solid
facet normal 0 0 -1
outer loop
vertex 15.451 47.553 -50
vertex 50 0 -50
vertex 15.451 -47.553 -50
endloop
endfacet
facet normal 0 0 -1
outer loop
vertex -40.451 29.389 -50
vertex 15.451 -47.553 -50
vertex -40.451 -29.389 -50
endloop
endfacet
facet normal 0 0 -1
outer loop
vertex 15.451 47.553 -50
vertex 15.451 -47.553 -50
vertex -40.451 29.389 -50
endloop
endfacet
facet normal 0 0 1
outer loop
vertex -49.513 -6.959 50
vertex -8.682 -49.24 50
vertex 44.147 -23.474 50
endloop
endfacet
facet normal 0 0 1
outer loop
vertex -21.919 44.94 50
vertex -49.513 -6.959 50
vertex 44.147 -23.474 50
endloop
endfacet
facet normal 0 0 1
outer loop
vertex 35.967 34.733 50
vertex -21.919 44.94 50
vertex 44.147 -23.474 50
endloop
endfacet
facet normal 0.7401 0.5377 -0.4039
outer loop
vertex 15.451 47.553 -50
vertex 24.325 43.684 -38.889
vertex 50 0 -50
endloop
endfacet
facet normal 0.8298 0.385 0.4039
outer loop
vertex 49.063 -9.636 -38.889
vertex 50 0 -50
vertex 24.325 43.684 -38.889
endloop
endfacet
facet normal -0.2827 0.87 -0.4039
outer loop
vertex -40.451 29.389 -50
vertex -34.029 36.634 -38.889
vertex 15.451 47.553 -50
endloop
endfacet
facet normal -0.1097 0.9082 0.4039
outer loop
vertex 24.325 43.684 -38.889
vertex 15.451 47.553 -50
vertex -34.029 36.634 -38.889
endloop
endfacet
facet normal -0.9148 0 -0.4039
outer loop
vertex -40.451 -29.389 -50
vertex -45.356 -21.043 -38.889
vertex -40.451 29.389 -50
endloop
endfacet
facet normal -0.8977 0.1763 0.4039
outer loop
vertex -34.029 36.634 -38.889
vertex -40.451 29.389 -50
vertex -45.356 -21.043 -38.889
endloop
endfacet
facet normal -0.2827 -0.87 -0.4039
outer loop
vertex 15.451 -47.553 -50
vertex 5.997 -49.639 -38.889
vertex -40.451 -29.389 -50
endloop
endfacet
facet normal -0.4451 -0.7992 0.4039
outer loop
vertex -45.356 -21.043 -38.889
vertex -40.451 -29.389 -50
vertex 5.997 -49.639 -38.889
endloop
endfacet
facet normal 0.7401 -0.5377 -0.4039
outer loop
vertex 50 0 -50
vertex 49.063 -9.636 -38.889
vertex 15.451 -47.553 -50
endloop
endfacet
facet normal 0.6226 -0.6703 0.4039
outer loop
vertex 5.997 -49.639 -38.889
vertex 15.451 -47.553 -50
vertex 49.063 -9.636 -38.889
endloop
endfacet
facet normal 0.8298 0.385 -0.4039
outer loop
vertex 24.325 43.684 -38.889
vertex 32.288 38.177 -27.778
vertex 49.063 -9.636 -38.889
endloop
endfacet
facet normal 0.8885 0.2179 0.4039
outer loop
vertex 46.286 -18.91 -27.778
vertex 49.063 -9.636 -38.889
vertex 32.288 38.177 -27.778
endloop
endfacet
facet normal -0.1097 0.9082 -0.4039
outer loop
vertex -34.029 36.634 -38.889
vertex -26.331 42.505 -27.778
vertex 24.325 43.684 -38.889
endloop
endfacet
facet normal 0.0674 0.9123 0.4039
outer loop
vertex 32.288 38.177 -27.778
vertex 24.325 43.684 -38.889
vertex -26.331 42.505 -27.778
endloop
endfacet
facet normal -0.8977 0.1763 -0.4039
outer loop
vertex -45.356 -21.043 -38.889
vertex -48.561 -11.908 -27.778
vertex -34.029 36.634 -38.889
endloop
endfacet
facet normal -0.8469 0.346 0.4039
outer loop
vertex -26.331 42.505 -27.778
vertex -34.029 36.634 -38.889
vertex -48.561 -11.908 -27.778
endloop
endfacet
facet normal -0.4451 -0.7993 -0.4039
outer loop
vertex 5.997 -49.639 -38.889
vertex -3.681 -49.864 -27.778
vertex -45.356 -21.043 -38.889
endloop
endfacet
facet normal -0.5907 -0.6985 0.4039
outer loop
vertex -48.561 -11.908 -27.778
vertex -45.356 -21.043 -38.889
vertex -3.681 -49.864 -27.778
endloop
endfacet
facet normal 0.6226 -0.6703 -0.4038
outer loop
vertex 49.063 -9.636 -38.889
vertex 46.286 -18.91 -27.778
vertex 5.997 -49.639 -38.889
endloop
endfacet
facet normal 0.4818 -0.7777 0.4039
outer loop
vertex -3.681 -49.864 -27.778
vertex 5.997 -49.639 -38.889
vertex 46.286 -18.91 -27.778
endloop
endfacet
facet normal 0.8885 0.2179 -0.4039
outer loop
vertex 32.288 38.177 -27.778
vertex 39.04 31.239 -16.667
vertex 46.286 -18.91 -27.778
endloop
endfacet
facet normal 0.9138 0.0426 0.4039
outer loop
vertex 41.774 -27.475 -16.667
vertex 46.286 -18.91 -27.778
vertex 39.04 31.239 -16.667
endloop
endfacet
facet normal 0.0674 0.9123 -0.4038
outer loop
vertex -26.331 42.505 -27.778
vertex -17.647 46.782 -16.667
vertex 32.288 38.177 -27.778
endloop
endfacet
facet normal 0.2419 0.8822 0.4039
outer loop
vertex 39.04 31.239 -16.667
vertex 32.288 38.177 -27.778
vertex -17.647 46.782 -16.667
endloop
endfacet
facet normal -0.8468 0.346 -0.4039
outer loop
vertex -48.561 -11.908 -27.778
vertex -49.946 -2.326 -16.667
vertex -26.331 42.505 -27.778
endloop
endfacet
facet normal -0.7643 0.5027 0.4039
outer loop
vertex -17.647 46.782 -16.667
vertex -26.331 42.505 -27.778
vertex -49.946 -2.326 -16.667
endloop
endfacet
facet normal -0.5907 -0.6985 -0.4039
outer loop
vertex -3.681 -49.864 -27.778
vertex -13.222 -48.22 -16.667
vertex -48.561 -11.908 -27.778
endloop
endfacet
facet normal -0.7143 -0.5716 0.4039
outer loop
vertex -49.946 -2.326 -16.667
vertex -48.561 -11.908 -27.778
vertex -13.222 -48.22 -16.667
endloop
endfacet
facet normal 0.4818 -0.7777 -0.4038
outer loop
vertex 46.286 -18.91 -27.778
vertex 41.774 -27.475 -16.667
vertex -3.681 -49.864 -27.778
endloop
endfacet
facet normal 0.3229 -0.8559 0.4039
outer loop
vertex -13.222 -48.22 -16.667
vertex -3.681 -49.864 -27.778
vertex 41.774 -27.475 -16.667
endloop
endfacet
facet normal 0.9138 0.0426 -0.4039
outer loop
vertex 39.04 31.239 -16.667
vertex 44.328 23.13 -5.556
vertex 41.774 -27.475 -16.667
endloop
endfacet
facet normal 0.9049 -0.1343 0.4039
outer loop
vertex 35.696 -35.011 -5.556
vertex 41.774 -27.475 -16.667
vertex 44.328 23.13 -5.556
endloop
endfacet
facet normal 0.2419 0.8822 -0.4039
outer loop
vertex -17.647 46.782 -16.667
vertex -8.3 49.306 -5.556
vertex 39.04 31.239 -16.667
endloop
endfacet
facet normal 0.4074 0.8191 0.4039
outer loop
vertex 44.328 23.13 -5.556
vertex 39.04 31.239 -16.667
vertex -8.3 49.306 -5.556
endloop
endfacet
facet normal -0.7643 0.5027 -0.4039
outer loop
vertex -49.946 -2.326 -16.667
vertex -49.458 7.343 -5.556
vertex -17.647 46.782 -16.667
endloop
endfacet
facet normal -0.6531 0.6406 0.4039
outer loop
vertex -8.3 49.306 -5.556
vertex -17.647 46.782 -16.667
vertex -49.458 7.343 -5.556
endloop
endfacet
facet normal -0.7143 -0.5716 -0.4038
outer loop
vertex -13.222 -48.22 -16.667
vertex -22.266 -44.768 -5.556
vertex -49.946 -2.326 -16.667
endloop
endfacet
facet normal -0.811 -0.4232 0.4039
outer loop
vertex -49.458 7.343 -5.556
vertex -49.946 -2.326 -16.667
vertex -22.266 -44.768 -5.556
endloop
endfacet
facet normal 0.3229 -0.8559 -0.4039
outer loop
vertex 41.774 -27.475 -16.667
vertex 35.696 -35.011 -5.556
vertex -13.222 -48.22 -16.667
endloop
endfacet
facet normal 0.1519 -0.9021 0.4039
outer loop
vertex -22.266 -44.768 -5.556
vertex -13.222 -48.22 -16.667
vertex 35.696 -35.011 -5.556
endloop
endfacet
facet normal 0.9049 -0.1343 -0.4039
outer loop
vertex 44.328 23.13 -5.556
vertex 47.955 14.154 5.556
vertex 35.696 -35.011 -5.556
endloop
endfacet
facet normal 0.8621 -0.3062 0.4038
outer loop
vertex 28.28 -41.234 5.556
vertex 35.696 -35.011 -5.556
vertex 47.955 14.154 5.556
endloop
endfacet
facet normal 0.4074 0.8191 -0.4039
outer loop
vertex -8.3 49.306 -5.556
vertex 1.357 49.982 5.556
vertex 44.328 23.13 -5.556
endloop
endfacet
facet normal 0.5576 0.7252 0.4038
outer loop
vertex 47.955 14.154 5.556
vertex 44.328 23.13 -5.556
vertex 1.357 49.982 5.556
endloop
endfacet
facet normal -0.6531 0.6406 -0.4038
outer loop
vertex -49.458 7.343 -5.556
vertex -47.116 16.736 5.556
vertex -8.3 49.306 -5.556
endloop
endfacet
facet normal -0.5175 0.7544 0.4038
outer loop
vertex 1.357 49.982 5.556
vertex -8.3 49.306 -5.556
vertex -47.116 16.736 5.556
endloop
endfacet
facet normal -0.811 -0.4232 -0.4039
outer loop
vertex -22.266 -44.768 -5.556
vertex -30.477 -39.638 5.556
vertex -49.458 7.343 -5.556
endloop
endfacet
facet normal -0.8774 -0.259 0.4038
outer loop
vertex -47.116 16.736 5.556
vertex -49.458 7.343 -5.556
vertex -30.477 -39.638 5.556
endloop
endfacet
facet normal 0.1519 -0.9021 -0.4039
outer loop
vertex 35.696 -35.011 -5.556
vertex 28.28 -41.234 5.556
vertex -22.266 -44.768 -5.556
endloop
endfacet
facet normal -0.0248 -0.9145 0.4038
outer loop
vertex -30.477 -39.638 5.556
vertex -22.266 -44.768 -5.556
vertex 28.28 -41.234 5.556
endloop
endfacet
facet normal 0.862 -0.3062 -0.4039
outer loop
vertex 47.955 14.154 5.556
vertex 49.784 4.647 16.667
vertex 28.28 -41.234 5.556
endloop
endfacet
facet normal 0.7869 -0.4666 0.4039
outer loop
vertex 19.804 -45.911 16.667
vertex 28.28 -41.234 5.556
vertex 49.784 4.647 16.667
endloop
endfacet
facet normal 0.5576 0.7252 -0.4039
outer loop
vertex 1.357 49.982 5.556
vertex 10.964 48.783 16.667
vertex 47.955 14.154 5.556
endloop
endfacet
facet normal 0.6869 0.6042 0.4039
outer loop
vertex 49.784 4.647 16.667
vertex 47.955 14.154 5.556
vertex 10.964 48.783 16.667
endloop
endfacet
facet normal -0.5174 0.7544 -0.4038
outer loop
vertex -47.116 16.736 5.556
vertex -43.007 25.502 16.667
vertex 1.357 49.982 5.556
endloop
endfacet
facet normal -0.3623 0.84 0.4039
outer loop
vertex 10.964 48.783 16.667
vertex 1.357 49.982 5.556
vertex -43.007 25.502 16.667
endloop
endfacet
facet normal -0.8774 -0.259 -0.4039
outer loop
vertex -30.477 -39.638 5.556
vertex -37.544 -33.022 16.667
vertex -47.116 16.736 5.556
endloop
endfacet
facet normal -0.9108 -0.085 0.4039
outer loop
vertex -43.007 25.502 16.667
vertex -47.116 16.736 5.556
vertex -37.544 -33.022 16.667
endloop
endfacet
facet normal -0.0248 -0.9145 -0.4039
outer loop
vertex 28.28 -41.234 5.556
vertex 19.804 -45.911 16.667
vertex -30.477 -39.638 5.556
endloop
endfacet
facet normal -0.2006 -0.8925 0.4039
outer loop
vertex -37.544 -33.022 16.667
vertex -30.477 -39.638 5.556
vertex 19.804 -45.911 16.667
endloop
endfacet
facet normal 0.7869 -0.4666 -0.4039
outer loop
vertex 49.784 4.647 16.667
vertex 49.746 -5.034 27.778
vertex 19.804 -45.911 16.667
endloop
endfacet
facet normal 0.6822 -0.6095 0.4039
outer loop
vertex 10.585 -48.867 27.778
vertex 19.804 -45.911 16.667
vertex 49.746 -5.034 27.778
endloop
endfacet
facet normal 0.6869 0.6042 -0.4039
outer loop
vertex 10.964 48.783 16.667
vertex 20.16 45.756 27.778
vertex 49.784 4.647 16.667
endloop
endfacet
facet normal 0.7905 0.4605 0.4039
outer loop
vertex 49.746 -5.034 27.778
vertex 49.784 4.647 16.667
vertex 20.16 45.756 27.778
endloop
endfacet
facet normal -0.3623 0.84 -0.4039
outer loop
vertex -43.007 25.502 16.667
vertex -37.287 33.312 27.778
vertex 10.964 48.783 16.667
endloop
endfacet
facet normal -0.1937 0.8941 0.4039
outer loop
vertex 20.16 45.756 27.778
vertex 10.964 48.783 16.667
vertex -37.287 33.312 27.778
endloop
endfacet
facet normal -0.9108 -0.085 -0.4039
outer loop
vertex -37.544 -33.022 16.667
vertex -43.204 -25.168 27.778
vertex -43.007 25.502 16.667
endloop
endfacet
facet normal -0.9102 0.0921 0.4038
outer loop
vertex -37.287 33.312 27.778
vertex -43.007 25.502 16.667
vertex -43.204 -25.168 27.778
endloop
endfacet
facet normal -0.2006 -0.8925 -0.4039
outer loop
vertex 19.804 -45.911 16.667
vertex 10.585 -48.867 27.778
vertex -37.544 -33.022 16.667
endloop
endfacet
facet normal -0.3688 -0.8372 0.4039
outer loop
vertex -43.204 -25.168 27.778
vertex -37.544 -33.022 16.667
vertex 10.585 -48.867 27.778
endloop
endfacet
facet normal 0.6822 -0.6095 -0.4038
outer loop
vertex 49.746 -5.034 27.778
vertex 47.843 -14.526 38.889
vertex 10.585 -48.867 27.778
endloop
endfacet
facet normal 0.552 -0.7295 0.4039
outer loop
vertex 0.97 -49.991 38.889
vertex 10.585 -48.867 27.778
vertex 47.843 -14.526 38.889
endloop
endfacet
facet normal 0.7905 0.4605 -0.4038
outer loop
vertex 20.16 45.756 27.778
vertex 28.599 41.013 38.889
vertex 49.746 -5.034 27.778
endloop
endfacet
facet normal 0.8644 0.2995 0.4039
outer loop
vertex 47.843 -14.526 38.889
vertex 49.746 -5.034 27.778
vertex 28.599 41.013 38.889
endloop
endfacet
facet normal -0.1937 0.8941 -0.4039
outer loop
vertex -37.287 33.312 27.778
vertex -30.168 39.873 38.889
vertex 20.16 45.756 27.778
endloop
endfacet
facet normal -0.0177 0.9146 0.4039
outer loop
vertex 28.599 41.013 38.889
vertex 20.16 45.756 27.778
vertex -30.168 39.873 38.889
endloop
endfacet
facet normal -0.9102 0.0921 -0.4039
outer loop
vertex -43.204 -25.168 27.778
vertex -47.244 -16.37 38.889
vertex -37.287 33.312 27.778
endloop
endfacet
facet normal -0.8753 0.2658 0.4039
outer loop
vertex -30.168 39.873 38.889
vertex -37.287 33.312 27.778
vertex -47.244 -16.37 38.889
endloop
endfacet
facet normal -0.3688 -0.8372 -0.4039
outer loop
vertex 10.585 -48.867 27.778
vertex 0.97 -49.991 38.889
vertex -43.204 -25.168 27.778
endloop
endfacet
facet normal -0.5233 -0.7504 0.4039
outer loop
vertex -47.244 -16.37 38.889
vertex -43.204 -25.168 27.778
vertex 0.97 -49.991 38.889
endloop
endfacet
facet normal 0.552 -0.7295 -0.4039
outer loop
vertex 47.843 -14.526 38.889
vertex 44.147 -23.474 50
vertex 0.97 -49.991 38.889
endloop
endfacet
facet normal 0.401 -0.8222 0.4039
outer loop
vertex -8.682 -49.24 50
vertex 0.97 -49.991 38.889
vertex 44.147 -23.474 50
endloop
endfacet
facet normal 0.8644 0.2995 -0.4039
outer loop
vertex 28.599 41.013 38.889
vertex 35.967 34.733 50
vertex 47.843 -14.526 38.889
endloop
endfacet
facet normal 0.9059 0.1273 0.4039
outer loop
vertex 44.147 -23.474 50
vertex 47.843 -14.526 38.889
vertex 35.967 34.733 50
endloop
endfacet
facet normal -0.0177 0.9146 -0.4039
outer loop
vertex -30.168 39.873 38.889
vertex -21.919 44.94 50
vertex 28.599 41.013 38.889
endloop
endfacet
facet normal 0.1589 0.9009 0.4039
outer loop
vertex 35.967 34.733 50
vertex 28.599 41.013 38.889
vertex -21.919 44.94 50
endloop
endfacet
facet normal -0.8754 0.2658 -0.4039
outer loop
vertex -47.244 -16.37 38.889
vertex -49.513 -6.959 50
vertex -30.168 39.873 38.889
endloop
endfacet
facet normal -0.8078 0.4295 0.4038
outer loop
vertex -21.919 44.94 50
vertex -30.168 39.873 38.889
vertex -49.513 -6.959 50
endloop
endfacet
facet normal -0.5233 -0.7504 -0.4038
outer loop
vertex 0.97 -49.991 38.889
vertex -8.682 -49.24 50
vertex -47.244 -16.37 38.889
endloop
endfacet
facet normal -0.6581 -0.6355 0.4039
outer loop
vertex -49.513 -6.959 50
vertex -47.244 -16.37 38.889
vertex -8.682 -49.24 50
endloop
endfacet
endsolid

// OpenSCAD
linear_extrude(height=100,twist=100,center=true)
circle(d=100,$fn=5);
